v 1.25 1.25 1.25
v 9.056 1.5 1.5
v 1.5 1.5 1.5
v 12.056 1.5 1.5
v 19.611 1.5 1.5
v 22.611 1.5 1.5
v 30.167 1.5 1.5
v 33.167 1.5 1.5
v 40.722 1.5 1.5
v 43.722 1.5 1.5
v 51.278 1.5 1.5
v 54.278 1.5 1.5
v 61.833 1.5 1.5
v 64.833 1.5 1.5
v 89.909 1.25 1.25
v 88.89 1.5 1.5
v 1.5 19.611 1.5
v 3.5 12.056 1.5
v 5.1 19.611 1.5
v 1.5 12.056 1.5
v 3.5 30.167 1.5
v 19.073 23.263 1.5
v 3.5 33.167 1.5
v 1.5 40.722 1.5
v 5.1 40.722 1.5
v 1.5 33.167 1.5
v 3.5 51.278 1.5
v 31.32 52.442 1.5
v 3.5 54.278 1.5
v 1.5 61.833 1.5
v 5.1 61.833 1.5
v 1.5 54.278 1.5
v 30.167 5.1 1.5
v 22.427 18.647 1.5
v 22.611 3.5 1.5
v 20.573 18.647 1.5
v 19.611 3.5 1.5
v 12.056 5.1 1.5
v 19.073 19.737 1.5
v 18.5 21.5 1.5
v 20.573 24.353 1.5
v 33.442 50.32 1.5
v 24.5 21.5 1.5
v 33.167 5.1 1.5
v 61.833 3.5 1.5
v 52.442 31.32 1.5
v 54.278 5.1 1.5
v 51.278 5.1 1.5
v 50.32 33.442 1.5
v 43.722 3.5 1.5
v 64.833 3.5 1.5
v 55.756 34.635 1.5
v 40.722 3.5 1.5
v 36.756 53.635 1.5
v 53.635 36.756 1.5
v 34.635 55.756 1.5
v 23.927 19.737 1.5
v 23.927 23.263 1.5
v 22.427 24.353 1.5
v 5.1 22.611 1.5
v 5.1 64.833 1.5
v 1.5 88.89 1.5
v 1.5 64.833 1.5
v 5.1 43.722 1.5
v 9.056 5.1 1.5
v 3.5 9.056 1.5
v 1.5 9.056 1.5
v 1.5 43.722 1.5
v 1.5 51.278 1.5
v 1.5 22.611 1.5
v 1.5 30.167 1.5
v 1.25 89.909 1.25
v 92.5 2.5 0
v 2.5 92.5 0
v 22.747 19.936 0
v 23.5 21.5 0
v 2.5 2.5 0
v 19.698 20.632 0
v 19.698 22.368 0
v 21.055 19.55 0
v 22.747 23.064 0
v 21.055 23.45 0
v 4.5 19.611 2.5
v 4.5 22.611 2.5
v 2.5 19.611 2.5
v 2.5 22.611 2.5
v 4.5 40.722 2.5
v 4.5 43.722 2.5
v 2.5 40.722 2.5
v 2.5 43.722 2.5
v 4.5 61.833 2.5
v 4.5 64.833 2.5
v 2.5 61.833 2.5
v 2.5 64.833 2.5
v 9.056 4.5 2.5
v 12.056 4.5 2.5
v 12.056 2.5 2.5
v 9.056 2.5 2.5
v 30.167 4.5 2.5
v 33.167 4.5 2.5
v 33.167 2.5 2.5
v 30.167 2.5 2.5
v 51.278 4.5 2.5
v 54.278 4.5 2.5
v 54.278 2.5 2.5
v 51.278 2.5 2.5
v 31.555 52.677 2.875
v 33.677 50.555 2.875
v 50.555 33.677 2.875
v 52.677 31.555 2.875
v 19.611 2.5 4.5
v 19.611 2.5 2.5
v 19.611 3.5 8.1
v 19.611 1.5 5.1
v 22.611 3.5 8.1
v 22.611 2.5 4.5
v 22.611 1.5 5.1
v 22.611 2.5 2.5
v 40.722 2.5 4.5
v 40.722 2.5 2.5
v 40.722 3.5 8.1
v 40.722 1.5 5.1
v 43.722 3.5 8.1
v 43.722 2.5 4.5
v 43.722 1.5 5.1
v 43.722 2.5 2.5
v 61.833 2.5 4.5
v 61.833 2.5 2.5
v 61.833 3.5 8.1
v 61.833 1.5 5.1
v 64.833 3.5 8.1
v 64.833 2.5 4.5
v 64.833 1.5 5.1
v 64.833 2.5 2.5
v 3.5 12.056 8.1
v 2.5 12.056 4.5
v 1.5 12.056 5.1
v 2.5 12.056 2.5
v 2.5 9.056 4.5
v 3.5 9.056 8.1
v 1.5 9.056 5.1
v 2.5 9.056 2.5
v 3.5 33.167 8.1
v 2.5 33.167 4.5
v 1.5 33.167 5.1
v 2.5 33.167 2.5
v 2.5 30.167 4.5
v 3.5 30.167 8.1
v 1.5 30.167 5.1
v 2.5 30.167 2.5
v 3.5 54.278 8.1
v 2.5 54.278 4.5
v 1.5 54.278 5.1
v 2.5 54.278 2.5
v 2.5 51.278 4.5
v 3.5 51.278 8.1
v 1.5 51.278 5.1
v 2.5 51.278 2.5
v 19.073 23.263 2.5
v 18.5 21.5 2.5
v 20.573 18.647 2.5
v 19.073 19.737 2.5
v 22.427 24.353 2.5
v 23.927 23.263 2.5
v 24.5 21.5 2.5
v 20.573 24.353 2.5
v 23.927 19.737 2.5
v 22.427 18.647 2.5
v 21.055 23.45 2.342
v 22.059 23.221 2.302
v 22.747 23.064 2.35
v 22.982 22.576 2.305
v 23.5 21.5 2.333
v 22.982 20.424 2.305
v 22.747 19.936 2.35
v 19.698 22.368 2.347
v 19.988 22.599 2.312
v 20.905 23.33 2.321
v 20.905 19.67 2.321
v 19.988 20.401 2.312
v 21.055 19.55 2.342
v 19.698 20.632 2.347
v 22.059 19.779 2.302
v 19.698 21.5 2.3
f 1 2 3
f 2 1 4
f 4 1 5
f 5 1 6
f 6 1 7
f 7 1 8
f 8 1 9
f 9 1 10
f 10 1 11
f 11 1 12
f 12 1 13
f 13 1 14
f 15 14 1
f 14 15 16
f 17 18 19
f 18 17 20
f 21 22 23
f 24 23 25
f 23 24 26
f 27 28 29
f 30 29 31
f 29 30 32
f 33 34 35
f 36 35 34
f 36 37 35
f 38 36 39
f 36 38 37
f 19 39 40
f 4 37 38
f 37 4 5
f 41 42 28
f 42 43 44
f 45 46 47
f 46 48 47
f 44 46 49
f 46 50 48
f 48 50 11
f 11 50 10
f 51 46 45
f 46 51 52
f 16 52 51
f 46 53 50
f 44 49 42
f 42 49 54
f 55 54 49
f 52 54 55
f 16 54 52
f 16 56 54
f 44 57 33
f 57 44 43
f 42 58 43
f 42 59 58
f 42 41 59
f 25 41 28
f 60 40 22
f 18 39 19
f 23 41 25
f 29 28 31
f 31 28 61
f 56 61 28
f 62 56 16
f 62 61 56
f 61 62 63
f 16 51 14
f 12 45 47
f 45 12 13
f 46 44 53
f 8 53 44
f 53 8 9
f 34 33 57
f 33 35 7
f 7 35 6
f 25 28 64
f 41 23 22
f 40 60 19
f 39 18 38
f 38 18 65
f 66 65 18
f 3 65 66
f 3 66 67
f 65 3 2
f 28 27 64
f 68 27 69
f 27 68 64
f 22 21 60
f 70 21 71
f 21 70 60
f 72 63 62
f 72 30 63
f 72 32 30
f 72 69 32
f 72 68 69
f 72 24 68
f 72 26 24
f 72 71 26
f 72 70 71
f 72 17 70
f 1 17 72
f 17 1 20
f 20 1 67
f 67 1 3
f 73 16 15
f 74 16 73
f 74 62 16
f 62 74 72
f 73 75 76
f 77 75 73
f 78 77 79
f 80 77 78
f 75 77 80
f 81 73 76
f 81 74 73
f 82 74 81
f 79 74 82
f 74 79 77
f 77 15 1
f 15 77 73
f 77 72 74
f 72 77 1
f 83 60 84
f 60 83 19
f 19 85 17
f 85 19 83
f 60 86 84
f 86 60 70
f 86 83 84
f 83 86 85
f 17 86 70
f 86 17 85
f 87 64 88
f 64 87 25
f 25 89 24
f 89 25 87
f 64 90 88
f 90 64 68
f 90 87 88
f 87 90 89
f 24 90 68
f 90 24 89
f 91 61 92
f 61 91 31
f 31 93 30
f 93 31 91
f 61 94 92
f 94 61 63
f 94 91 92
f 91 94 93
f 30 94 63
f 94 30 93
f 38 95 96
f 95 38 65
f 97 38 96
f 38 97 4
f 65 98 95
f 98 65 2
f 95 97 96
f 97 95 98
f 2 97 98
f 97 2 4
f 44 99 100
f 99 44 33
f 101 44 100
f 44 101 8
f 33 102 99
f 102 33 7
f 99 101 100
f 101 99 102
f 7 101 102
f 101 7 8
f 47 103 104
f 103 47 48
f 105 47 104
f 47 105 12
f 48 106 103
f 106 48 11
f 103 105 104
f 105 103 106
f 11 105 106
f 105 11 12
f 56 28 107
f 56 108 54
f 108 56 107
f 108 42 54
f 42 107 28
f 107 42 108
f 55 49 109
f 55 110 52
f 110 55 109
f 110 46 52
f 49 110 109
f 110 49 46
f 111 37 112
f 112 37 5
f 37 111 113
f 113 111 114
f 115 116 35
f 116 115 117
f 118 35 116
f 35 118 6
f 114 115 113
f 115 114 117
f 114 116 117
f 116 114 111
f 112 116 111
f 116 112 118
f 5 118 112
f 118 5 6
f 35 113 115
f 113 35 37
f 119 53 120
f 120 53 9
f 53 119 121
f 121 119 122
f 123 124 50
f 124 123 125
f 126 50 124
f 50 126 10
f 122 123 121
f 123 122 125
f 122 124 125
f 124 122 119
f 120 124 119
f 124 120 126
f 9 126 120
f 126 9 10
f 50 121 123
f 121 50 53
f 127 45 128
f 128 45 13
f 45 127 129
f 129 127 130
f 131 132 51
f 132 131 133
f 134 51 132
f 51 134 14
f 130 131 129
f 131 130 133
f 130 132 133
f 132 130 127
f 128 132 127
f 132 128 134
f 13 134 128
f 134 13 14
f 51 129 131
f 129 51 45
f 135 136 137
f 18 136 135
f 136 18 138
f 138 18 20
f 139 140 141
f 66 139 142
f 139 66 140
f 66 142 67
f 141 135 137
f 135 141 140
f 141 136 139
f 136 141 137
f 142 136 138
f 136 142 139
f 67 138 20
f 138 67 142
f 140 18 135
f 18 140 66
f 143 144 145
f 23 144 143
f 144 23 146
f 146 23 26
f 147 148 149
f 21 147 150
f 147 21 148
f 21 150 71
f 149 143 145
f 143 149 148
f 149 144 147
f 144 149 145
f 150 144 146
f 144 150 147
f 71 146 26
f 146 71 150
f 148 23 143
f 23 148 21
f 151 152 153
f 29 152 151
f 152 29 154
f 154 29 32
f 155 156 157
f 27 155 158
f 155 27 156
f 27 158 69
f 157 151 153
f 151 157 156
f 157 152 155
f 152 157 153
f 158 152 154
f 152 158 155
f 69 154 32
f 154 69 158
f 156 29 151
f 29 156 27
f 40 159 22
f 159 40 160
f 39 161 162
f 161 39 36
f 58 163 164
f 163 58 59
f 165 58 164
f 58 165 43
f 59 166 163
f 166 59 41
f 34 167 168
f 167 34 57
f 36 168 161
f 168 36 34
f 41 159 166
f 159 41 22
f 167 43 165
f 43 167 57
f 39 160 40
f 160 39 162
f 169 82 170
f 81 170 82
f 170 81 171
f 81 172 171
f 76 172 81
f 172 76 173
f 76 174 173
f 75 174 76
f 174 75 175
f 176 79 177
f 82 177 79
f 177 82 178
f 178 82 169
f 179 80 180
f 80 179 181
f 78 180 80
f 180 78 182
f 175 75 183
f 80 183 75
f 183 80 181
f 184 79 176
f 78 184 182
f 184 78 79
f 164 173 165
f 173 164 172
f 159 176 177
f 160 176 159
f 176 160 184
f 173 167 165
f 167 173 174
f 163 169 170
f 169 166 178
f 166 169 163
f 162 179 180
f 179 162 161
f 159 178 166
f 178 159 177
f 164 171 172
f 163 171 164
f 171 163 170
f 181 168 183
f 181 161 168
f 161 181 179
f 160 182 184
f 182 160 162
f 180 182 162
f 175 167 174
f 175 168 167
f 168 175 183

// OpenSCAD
// This code builds a box with three arbitrary sides that fits into the corner of a room. You can add arbitrary holes for a cable (wall panels) or some sensors (room side). The wall panels are identical if the side lengths are. Wall-to-wall edges can be mitered because wall corners often are. Miter depth is measured along the wall and can be > the box thickness. The miter angle is always 45°.

// All measurements are in mm.

/* version history
1.1: published at Thingiverse
1.2: add comments for Thingiverse Customizer
1.3: generation of holes was missing in some views
1.4: fix min distance of hole from lid edge
1.5: configure offset of hooks from lid
1.6: add dummy module to hopefully fix Customizer
1.7: fix low hole count, adjust hole positions
1.8: add cable hole, add (up to 4) top holes
*/

// length of first edge
side_x = 95   ; // [20:250]

// length of second edge
side_y = side_x; // [20:250]

// length of third edge
side_z = 110; // [20:250]

// thickness of walls.
wall_side = 1.5; // [10]

// thickness of lid.
wall_top = 2; // [10]

// how much to cut off at the edge, for better fit to walls. Must be less than min side wall thickness.
edge_miter = 2.5; // [0:0.1:2]

// output: top, sides 1-3, all four on plane, assembled, w/o top, w/o side 1-3
output = 3; // [0:1:9]

// which side shall have a hole for a cable? Zero=None
cable_side = 2; // [0-4]

// diameter of the cable
cable_width = 12; // [2-15]

// distance A
cable_y = 70-6; // [10-100]

// distance B
cable_x = 25-6; // [10-100]

// direction? 0=along X, 90=along Y, -1=towards Z-axis, -2=none
cable_angle=90; // [-2-90]

/*
Holes in the top, for things to poke through
*/

// center hole
th_center = 22.5; // [0-30]

// Offset for a hole near the X corner
th_off_x = 30; // [0-100]

// Offset for a hole near the Y corner
th_off_y = 20; // [0-100]

// Offset for a hole near the Z corner
th_off_z = 70; // [0-100]

// Size of a hole near the X corner
th_size_x = 0; // [0-20]

// Size of a hole near the Y corner
th_size_y = 0; // [0-20]

// Size of a hole near the Z corner
th_size_z = 4; // [0-20]


/* add mounting holes? at most n per side. They start in the corner and extend until there are either n/2 on a side or they get too close to the edge. NB: there's no collision check of holes vs. hooks! */
// number of mounting holes
n_holes = 1; // [0:11]
// bore diameter of hole, must be <ring
hole_inner = 4; // [2:0.5:8]
// diameter of strengthening ring
hole_outer = 6; // [3:0.5:12]
// height of strenghtening ring
hole_height = 1; // [0:2]
// sink inner edge of hole (for slanted-head screws)
hole_inner_sink = 0.5; // [0:0.2:5]
// distance of the holes from the edges
hole_edge = 20; // [0:0.5:30]
// distance between holes on the same edge
hole_offset = 18; // [0:0.5:50]

// separation between pieces when printing
delta = 5; // [1:2:11]

// number of hooks per edge, evenly spaced.
n_hooks = 2; // [0:5]
// hook width
hook_width = 2; // [1:0.5:5]
// width of the groove
groove_width = 3; // [1:0.5:7]
// additional offset of sides' hooks from lid (to prevent collisions with lid)
hook_off_edge = 1; // [0.5:0.5:4]
// hook depth (that's the part that bends)
hook_depth = 1; // [0.5:0.25:2.5]
// length of the part that bends
hook_len = 3; // [1:0.5:10]
// how far does the tip of the hook extend?
hook_edge_depth = 1; // [0.5:0.25:3]
// height of slanted part under the tip
hook_edge = 1; // [1:0.5:3]
// height of the head (from tip to top)
hook_head = 2; // [1:0.5:5]
// additional stremgthening of the base so the hook doesn't tear off
hook_base = 1; // [0:0.5:3]

// depth
hook_base_depth = hook_base;


/*
 * The pieces are joined with a couple of fancy hooks, the parameters for which require some explaining.

This is the groove which the hook joins:
 
     |   |
     |   |
     |   |
     |   | /- here is where the tip ends up at
    /    | -- hook_edge
    |    | -- hook_len
     \   | -- the part's edge is extended until it is hook_len high
      \  |
       \/  -- 1/2 miter

The top/side joins are <90° so this will be slanted to the left.

The hook, below, moves up and joins with the groove:
     /---- the top of the hook
 |\  ----- height: hook_head
 | \ /---- the tip of the hook
 | / ----- height: hook_edge
 | | ----- height: hook_len-hook_base
/ _|_----- height: hook_base (ASCII art is wrong, it's on the outside)
     \
      \
       \
_______/ - 1/2 miter
^ ^ ^ 
| |  \---- width: hook_edge_depth
|  \------ width: hook_depth
 \-------- width: hook_base_depth

For the top/side joins this will move to the left appropriately.

The hook shall be auto-placed so that it (a) meets with the groove and (b) isn't cut off by the miter.

hook_edge must be smaller than hook_edge_depth, otherwise the sides can just slide apart. This is not a problem with the top. TODO allow different parameters for it.

*/

module no_params_beyond_here() {
    // this is a lie but prevents Customizer to look beyond this
}

HOOKS_TOP = [n_hooks,hook_width,groove_width,hook_depth,hook_edge_depth,hook_head,hook_edge,hook_len,hook_base,hook_base_depth];
// Here you can modify the parameters for edges separately. Specifically we increase the edge depth so that the sides hold onto each other better, with an edge of 45° (or less) they'd slide apart.
HOOKS_EDGE = [3,hook_width,groove_width,hook_depth,hook_edge_depth,hook_head*1.5,hook_edge*0.6,hook_len,hook_base,hook_base_depth];

// Customizeable hooks. The basic lookup function just uses the same hook style everywhere.
function hc(n,c) = (n>=0) ? HOOKS_TOP[c] : HOOKS_EDGE[c];
N_HOOKS=0;
H_WIDTH=1;
H_G_WIDTH=2;
H_DEPTH=3;
H_EDGE_DEPTH=4;
H_HEAD=5;
H_EDGE=6;
H_LEN=7;
H_BASE=8;
H_BASE_DEPTH=9;

// don't change below this point

// first, some common trig formulae

function distance(a,b) = sqrt(a*a+b*b);

// Two circles of radius a and b, centered at (0,0) and (c,0), meet at (x,y):
function circle_intersect_x(a,c,b) = (a*a+c*c-b*b)/2/c;
function circle_intersect_y(a,x) = sqrt(a*a-x*x);

// all arrays are duplicated to avoid mod() when indexing with an offset

// arbitrary ordering so that side_x/side_y is at +x/+y when flattened.
// (z-axis ends up at -y, the y edge is mirrored to -x
//  the top of the box is in the -x/+y quadrant)
// This continues in the rest of the code: think of index zero as the Z axis
// or as referring to the XY-triangle that's perpendicular to it.
// Same for the other axes of course.

axes = [side_z,side_x,side_y,
        side_z,side_x,side_y,
        side_z,side_x,side_y]; 

// The edges are numbered so that edge N doesn't touch axis N
function _edge(n) = distance(axes[n+1], axes[n+2]);
edges = [_edge(0),_edge(1),_edge(2),
         _edge(0),_edge(1),_edge(2),
         _edge(0),_edge(1),_edge(2)];

// internal angles of side triangle n on the side in common with n+1
function side_angle(n) = atan2(axes[n+1], axes[n+2]);
angles1 = [side_angle(0),side_angle(1),side_angle(2),
           side_angle(0),side_angle(1),side_angle(2),
           side_angle(0),side_angle(1),side_angle(2)];

// The corners of the top plate, when it lies flat, are at X=(0,0) Z=(edge_y,0) Y=(x2,y2)
// yes this is the wrong way 'round, but that is intentional because you need to flip the lid when you put it on top of the box
x2=circle_intersect_x(edges[0],edges[2],edges[1]);
y2=circle_intersect_y(edges[0],x2);

// Heights of side triangles. Again, height vector N is perpendicular to axis N.
function _height(n) = sin(angles1[n]) * axes[n+2];
heights = [_height(0),_height(1),_height(2),
           _height(0),_height(1),_height(2),
           _height(0),_height(1),_height(2)];

// internal angle of the top plate against side N
function top_angle(n) = atan2(axes[n], heights[n]);
angles2 = [top_angle(0),top_angle(1),top_angle(2),
           top_angle(0),top_angle(1),top_angle(2),
           top_angle(0),top_angle(1),top_angle(2)];

// The edge to remove from wall N+1 so that it meets wall N-1 halfway,
// which can be rotated so that it's also the edge to remove from N-1
// to meet N+1 halfway, which is why there's only one chamfer1 module.
module chamfer1(n) {
    translate([0,0,wall_side])
        rotate(a=[0,90,0])
            linear_extrude(height=axes[n], center=false) 
                polygon([[0,0],[wall_side,0],[0,wall_side]]);
}

// A wall with thickness B merges with a wall with thickness A at angle Alpha
// so that their outer edges coincide. Calculate the angle Gamma (with 0<Gamma<Alpha)
// required to chamfer the edge of B so that the walls' inner edges also meet.
// (Verifying this formula is left as an exercise for the reader.)
function angle_c(alpha,a,b) = atan2(b, a/sin(alpha)+b/tan(alpha));

// The edge to remove from side N so that it meets the top halfway
module chamfer2(n) {
    ac = angle_c(angles2[n+2], wall_top, wall_side);

    translate([0,axes[n+1],wall_side])
        rotate([0,0,angles1[n+2]+180])
            rotate([-90,0,0])
                linear_extrude(height=edges[n+2], center=false) 
                    polygon([[0,0],[wall_side/tan(ac),0],[0,wall_side]]);
}

// The three chamfer edges of a side
module chamfer_side(n) {
    union() {
        chamfer1(n);
        translate([wall_side,0,wall_side]) rotate([-90,0,90]) chamfer1(n+1);
        chamfer2(n);
    }
}

// The edge to remove from the top so that it meets wall N halfway
module chamfer3(n) {
    ac = angle_c(angles2[n], wall_side, wall_top);
    rotate([0,90,0])
        linear_extrude(height=edges[n], center=false)
            polygon([[0,0],[-wall_top,0],[-wall_top,wall_top/tan(ac)]]);
}

// calculate the internal angle of the top triangle at corner N
// (also left as an exercise …)
function angle3(n) = acos((edges[n+1]*edges[n+1]+edges[n+2]*edges[n+2]-edges[n]*edges[n])/2/edges[n+1]/edges[n+2]);

// The three chamfer edges of the top
module chamfer_top() {
    union() {
        chamfer3(2); // the Y edge of the top plate lies along the x axis. See "corners of the top plate", above
        translate([x2,y2,0]) rotate([0,0,180+angle3(1)]) chamfer3(0);
        translate([edges[2],0,0]) rotate([0,0,180-angle3(0)]) chamfer3(1);
    }
}



// ***** Here's where we build our joints. ******

// polygon for the hook. n-1: edge-to-edge, else edge-to-top
module poly_hook(n) {
    a_hook = atan2(hc(n,H_HEAD), hc(n,H_DEPTH)+hc(n,H_EDGE_DEPTH));
    a_wall = (n<0) ? 90 : angles2[n];
    a_chamfer = (n<0) ? 45 : angle_c(angles2[n], wall_top, wall_side);

    y_tip = hc(n,H_LEN)+hc(n,H_EDGE);
    y_top = hc(n,H_LEN)+hc(n,H_EDGE)+hc(n,H_HEAD);

    // if a_hook > a_wall, the wall is too flat and we need to start with the hook's top
    x_top = (a_hook > a_wall) ? y_top/tan(a_wall) : y_tip/tan(a_wall)+hc(n,H_EDGE_DEPTH)+hc(n,H_DEPTH);
    x_tip = (a_hook > a_wall) ? y_top/tan(a_wall)-hc(n,H_EDGE_DEPTH)-hc(n,H_DEPTH) : y_tip/tan(a_wall);

    x_edge = x_tip+hc(n,H_EDGE_DEPTH);
    y_edge = y_tip-hc(n,H_EDGE);

    // base towards the center
    // polygon([[x_top,y_top], [x_tip,y_tip], [x_edge,y_edge], [x_edge,0], [x_edge+hook_depth+hc(n,H_BASE_DEPTH),0], [x_tip,hc(n,H_BASE)]]);
    // base towards the edge
    polygon([[x_top,y_top], [x_tip,y_tip], [x_edge,y_edge], [x_edge,hc(n,H_BASE)], [x_edge-hc(n,H_BASE_DEPTH),0], [x_edge+hc(n,H_DEPTH),0]]);

}

// polygon for the hook's groove. n-1: edge-to-edge, else edge-to-top
module poly_hook_groove(n) {
    a_hook = atan2(hc(n,H_HEAD), hc(n,H_DEPTH)+hc(n,H_EDGE_DEPTH));
    a_wall = (n<0) ? 90 : angles2[n];
    a_chamfer = (n<0) ? 45 : angle_c(angles2[n], wall_top, wall_side);

    y_tip = hc(n,H_LEN)+hc(n,H_EDGE);
    y_top = hc(n,H_LEN)+hc(n,H_EDGE)+hc(n,H_HEAD);

    if (a_hook > a_wall) { // wall too flat, need additional offset
        x_top = y_top/tan(a_wall);
        x_tip = x_top-hc(n,H_EDGE_DEPTH)-hc(n,H_DEPTH);
        x_edge = x_tip+hc(n,H_EDGE_DEPTH);
        y_edge = y_tip-hc(n,H_EDGE);
        x_base = x_edge - y_edge / tan(a_hook);
        rotate(atan2(x_top,y_top))
        polygon([[x_top,y_top],[x_tip,y_tip],  [x_edge,y_edge], [x_base,0], [0,0]]);
    } else { // simple case
        x_tip = y_tip*tan(90-a_wall); // avoid dividing by infinity
        x_edge = x_tip+hc(n,H_EDGE_DEPTH);
        y_edge = y_tip-hc(n,H_EDGE);
    
        // start at tip, counterclockwisewall_top*cos(angles2[n])
        rotate(atan2(x_tip,y_tip))
        if (x_edge/tan(a_chamfer) > y_edge)
            polygon([[x_tip,y_tip], [x_edge,y_edge], [0,0]]);
        else
            polygon([[x_tip,y_tip], [x_edge,y_edge], [x_edge,x_edge/tan(a_chamfer)], [0,0]]);

    }
}

// distribute hooks/grooves along the wall
module hook_pos_wall(n,off=0) {
    n_h = hc(-1-n,N_HOOKS);
    n_h_lim = n_h + hook_off_edge+0.5;
    for(x=[1:n_h])
        let(xx=(off?-0.5:0)+x) 
        translate([0,0,axes[n]*(off?n_h_lim-xx:xx)/n_h_lim])
        linear_extrude(hc(-1-n,H_G_WIDTH), center=true)
            children();
}

// grooves along the wall
module grooves_wall(n,off=0) {
    hook_pos_wall(n,off) poly_hook_groove(-1-n);
}

// hooks along the wall
module hooks_wall(n, off=0) {
    hook_pos_wall(n, off) poly_hook(-1-n);
}

// position hooks/grooves along the edge
module hook_pos_edge(n) {
    for(x=[1:hc(n,N_HOOKS)]) translate([0,0,edges[n]*(x+1)/(hc(n,N_HOOKS)+3)])
        linear_extrude(hc(n,H_G_WIDTH), center=true)
            children();
}

// grooves for the edge
module grooves_edge(n) {
    hook_pos_edge(n) poly_hook_groove(n);
}

// hooks along the edge
module hooks_edge(n) {
    a_chamfer = angle_c(angles2[n], wall_side,wall_top);
    rotate([0,90,0]) rotate(90)
    translate([wall_top/tan(a_chamfer),wall_top,0])
    hook_pos_edge(n) poly_hook(n);
}

// the actual hole, slightly larger so that preview sees it
module hole_bore() {
    union() {
        translate([0,0,-0.5]) cylinder(h=hole_height+wall_side+1,d=hole_inner);
        translate([0,0,wall_side+hole_height-hole_inner_sink]) cylinder(h=hole_inner_sink,d1=0,d2=hole_outer);
    }
}

// an inward-slanted ring on the hole, for stability when screwing it to an actual wall
module hole_ring() {
    cylinder(h=hole_height+wall_side,d=hole_outer);
}

// Position the holes.
module hole_pos(n) {
    // Start position
    inner = hole_edge+wall_side;
    
    // how close to the lid edge may we get?
    c_offset = wall_side/tan(angle_c(angles2[n], wall_top, wall_side)) + hole_outer/2 + hole_height/tan(angles2[n]);
    
    // Here we figure the corresponding max offsets. The first subtracted term gets us to the place we'd be if the holes were at the outer edge, but of course they aren't.
    lim_1 = axes[n+1] - c_offset / sin(90-angles1[n]) - inner*tan(angles1[n]);
    lim_2 = axes[n+2] - c_offset / sin(angles1[n]) - inner/tan(angles1[n]);

    // if there's an even number of holes, shift them to be halfway between the places they'd be if there was an odd number.
    union() {
        if (n_holes>0 && n_holes%2) translate([inner,inner,0]) children();
        if (n_holes>=2) for (x=[1:n_holes/2]) {
            offset=(x-(1-n_holes%2)/2)*hole_offset+inner;
            if (offset <= lim_1) translate([offset,inner,0]) children();
            if (offset <= lim_2) translate([inner,offset,0]) children();
        }
    }
}

// Modifier that adds holes
module make_holes(n) {
    difference() {
        union() {
            hole_pos(n) hole_ring();
        
            children();
        }
        hole_pos(n) hole_bore();
    }
}

// Main code: make a side
module side(n) {
    a_chamfer = angle_c(angles2[n], wall_top, wall_side);

    union() {
        difference() {
            linear_extrude(height=wall_side, center=false) 
                polygon([[0,0],[axes[n+1],0],[0,axes[n+2]]]);
            chamfer_side(n+1);
            #cable(n+1);
            to_next_side() mitered_edge(n+1);
            to_next_side() to_next_side() mitered_edge(n+2);
        }
        
        translate([wall_side,0,wall_side]) rotate([0,-90,-90]) grooves_wall(n+2,0);
        translate([axes[n+1],wall_side,wall_side]) rotate([-90,-90,90]) grooves_wall(n+1,1);
        
        // Yes this can be simplified, but then it'll be unreadable.
        translate([0,axes[n+2],wall_side]) rotate(angles1[n]-90) translate([0,-wall_side/tan(a_chamfer),0]) rotate([0,90,0]) rotate([0,0,180]) grooves_edge(n);
        translate([0,wall_side,wall_side]) rotate([0,90,0]) rotate([0,0,90])        hooks_wall(n+1,0);
        translate([wall_side,axes[n+2],wall_side]) rotate([90,0,0]) hooks_wall(n+2,1);
    }
}

// rotate side N (or something on it) to move to N+1
module to_next_side() {
    rotate([90,0,0]) rotate([0,90,0]) children();
}

// One outer edge chamfer.
module mitered_edge(n) {
    //translate([0,0,wall_side])
        linear_extrude(height=axes[n], center=false) 
                polygon([[0,0],[edge_miter,0],[0,edge_miter]]);
}

// All outer edge chamfers
module mitered_edges() {
    mitered_edge(0);
    to_next_side() mitered_edge(1);
    to_next_side() to_next_side() mitered_edge(2);
}

// show all sides where they belong
module uncut_sides(n=-1) {
    if (n != 1) make_holes(0) side(0);
    if (n != 2) to_next_side() color("red") make_holes(1) side(1);
    if (n != 3) to_next_side() to_next_side() color("green") make_holes(2) side(2);
}

module sides(n=-1) {
    difference() {
        uncut_sides(n);
        mitered_edges();
    }
}

// The hole for a cable on one of the sides.
module cable(n=1) {
    if(cable_side==n) {
        a=(cable_angle==-1) ? atan2(cable_y,cable_x) : cable_angle;
        hd=(distance(cable_x,cable_y)-cable_width)/3;
        translate([cable_x,cable_y,0]) {
            cylinder(h=wall_side, d=cable_width);
            if(cable_angle>-2) {
                translate([-cable_width*cos(a),-cable_width*sin(a),wall_side])
                    rotate(a)
                    rotate([90,0,0])
                    rotate_extrude(angle=90)
                        translate([cable_width, 0, 0])
                        circle(d = cable_width);
                translate([-cable_width*cos(a),-cable_width*sin(a), cable_width+wall_side]) rotate(a)
                    rotate(a=90,v=[0,-1,0])
                    cylinder(h=hd,d=cable_width);
            }
        }
    }
}

// helper to subtract the cable from the top
module cables() {
    cable(1);
    to_next_side() cable(2);
    to_next_side() to_next_side() cable(3);
}

// move the top to where it belongs
module to_top() {
    translate([axes[1],0,0])
        rotate(-180+angles2[0], v=[-axes[1],axes[2],0])
            rotate(90-angle3(1)+angles1[0])
                children();
}

// invert to_top. Required for the outer edge chamfer and cable.
module from_top() {
    rotate(angle3(1)-angles1[0]-90)
    rotate(180-angles2[0], v=[-axes[1],axes[2],0])
    translate([-axes[1],0,0])
    children();
}

module top_holes()
{
    ax=atan2(y2,x2);
    az=atan2(y2,(edges[2]-x2));
    ay=180-ax-az;
    ay2=180+ax+ay/2;
//xyz => yzx

    if(th_center) {
        x=edges[2]/(1+tan(ax/2)/tan(az/2));
        translate([x,x*tan(ax/2),-0.5]) cylinder(h=wall_top+1,d=th_center);
    }
    if(th_size_x) {
        translate([th_off_x*cos(ax/2),th_off_x*sin(ax/2),-0.5]) cylinder(h=wall_top+1,d=th_size_x);
    }
    if(th_size_y) {
        translate([x2+th_off_z*cos(ay2),y2+th_off_z*sin(ay2),-0.5]) cylinder(h=wall_top+1,d=th_size_y);
    }
    if(th_size_z) {
        translate([edges[2]-th_off_z*cos(ay/2),th_off_z*sin(az/2),-0.5]) cylinder(h=wall_top+1,d=th_size_z);
    }
}

// the top piece
module uncut_top() {
    union() {
        difference() {
            linear_extrude(height=wall_top, center=false) 
                polygon([[0,0],[edges[2],0],[x2,y2]]);
            chamfer_top();
            #top_holes();
        }
        hooks_edge(2);
        translate([x2,y2,0]) rotate([0,0,180+angle3(1)]) hooks_edge(0);
        translate([edges[2],0,0]) rotate([0,0,180-angle3(0)]) hooks_edge(1);
   }
}

// cut the mitered corners off the top edge. The math to do that explicitly is annoyingly complicated, so we simply reverse the transform that puts the top onto the box.
module top() {
    difference() {
        uncut_top();
        from_top() mitered_edges();
        from_top() cables();
    }
}

module box(n=-1) {
    union() {
        sides(n);
        if (n) to_top() top();
    }
}

module flat() {
    translate([delta/2,-delta/2,0]) rotate(270) make_holes(1) side(1);
    translate([delta/2,delta/2,0]) make_holes(2) side(2);
    translate([-delta/2,-delta/2,0]) rotate(180) make_holes(0) side(0);
    translate([-edges[2]-delta/2,delta/2,0]) top();
}

// output: top, sides 1-3, all four on plane, assembled, w/o top, w/o side 1-3
if (output == 0)
    top();
else if (output <= 3)
    make_holes(output) side(output);
else if (output == 4)
    flat();
else
    box(output-6);

module batt() {
    r=4;
    union() {
        cube([17,r,60]);
        translate([r,r,r]) minkowski() { cube([17-2*r,18-2*r,60-2*r]); sphere(r); } }
}
module pi() {
    r=5;
    union() {
        
        translate([r,r,0]) minkowski() {
            cube([32-2*r,67-2*r,18-2]);
            cylinder(1,r=r);
        }
        translate([32-2-5,8,18-1]) cube([5,52,7]);
    }
}
if(0 && (output>4)) {
translate([67+wall_side+2,19+wall_side+2,8+wall_side+2]) rotate(45) rotate([0,-125,0]) pi();
translate([wall_side+2,wall_side+2,wall_side+2]) batt();
}
